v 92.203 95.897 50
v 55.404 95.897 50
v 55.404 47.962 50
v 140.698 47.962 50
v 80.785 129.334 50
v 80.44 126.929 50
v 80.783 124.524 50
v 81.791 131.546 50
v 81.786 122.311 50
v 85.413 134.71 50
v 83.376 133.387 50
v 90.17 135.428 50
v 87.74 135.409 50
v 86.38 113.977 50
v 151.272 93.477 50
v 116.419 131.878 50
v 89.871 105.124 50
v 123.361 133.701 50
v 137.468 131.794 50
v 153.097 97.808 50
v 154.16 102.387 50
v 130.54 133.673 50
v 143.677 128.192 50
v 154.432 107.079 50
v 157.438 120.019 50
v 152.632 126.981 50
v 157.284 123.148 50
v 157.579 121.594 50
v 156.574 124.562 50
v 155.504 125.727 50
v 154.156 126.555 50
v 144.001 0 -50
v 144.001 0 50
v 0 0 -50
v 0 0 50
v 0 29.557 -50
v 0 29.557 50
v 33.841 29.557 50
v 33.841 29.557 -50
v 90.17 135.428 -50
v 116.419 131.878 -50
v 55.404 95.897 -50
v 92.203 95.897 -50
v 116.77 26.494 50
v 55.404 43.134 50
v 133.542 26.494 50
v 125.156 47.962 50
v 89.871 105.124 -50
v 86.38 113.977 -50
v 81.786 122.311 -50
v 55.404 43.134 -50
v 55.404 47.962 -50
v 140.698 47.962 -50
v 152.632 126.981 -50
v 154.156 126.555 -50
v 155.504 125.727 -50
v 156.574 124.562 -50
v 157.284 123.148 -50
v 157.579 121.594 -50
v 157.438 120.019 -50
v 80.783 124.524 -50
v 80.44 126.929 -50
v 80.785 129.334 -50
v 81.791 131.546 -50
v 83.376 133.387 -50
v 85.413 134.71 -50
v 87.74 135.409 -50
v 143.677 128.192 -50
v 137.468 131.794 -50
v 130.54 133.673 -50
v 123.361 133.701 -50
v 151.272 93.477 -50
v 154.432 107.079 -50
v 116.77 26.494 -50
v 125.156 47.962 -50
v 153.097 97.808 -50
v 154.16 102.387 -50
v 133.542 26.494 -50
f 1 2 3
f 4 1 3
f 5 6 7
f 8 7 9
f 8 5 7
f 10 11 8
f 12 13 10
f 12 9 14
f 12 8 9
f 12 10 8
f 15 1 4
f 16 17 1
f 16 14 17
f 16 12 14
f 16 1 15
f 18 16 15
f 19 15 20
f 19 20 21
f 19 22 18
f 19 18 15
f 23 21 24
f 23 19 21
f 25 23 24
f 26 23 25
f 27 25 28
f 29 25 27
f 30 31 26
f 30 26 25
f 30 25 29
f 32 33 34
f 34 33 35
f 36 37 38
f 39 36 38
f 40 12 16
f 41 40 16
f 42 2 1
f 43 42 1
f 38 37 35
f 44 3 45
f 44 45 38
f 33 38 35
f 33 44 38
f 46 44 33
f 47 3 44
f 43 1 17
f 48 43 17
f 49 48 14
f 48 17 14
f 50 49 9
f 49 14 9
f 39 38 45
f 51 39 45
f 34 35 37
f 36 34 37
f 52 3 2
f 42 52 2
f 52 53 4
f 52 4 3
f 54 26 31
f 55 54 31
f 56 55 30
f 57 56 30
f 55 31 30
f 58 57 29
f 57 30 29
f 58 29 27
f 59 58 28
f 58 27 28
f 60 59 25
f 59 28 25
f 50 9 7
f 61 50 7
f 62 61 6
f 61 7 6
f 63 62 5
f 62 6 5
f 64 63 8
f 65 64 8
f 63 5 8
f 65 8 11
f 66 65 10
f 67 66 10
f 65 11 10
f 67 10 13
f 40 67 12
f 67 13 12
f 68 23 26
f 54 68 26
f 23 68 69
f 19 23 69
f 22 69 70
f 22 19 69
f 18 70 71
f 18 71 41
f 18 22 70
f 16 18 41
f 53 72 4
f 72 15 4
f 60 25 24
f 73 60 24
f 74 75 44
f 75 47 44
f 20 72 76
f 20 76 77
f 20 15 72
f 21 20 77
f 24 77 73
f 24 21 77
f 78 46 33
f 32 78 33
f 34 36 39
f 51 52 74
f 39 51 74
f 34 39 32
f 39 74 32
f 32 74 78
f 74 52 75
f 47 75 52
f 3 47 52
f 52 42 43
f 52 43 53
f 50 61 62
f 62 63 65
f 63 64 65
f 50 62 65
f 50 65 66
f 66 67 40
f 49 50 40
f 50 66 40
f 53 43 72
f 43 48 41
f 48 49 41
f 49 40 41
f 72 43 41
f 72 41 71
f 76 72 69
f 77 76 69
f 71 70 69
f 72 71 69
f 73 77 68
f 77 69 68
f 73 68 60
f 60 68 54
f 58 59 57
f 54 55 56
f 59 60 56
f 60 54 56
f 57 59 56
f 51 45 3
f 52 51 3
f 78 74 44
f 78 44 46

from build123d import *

# Parameters (mm, degrees)
SKETCH_1_R                     = 27.60110162
EXTRUDE_1_DEPTH                = 50
SPLIT_BODIES_1_SURFACE_1_BACK  = 231.64
SPLIT_BODIES_1_SURFACE_1_DEPTH = 463.28
SPLIT_BODIES_1_SURFACE_2_BACK  = 231.64
SPLIT_BODIES_1_SURFACE_2_DEPTH = 463.28


with BuildPart() as part:
    # 草图1 → 凸台-拉伸1 (new, symmetric)
    with BuildSketch(Plane.XY):
        with Locations((126.841, 106.3205)):
            Circle(SKETCH_1_R)
        with BuildLine():
            Line((0, 29.556947787), (33.841128496, 29.556947787))
            Line((33.841128496, 29.556947787), (55.404404979, 43.133825573))
            Line((55.404404979, 43.133825573), (55.404404979, 95.897124924))
            Line((55.404404979, 95.897124924), (92.202864513, 95.897124924))
            ThreePointArc((92.202864513, 95.897124924), (88.266951773, 109.605982584), (81.786119565, 122.311217777))
            ThreePointArc((81.786119565, 122.311217777), (81.790702408, 131.54578908), (90.169806602, 135.427533672))
            Line((90.169806602, 135.427533672), (152.632483554, 126.981321854))
            ThreePointArc((152.632483554, 126.981321854), (156.573746893, 124.561834969), (157.437634447, 120.018579331))
            Line((157.437634447, 120.018579331), (140.698476255, 47.962391292))
            Line((140.698476255, 47.962391292), (125.156200351, 47.962391292))
            Line((125.156200351, 47.962391292), (116.770080258, 26.493923855))
            Line((116.770080258, 26.493923855), (133.542320443, 26.493923855))
            Line((133.542320443, 26.493923855), (144.001, 0))
            Line((144.001, 0), (0, 0))
            Line((0, 0), (0, 29.556947787))
        make_face()
    extrude(amount=EXTRUDE_1_DEPTH, both=True)


with BuildPart() as body_2:
    # Split Bodies 1: the piece behind the surface
    add(part.part)
    # Split Bodies 1 surface: a surface, the sketch's curves swept straight by 463.28 mm
    with BuildLine(Plane.XY.offset(50).offset(-SPLIT_BODIES_1_SURFACE_1_BACK), mode=Mode.PRIVATE) as split_bodies_1_surface_1_path:
        Line((125.156200351, 47.962391292), (37.921543342, 47.962391292))
    split_bodies_1_surface_1 = Shell.extrude(split_bodies_1_surface_1_path.wire(), (0 * SPLIT_BODIES_1_SURFACE_1_DEPTH, 0 * SPLIT_BODIES_1_SURFACE_1_DEPTH, 1 * SPLIT_BODIES_1_SURFACE_1_DEPTH))
    split(bisect_by=split_bodies_1_surface_1, keep=Keep.BOTTOM)


with BuildPart() as part_1:
    add(part.part)

    # Split Bodies 1: split by a surface, the side it looks to stays
    # Split Bodies 1 surface: a surface, the sketch's curves swept straight by 463.28 mm
    with BuildLine(Plane.XY.offset(50).offset(-SPLIT_BODIES_1_SURFACE_2_BACK), mode=Mode.PRIVATE) as split_bodies_1_surface_2_path:
        Line((125.156200351, 47.962391292), (37.921543342, 47.962391292))
    split_bodies_1_surface_2 = Shell.extrude(split_bodies_1_surface_2_path.wire(), (0 * SPLIT_BODIES_1_SURFACE_2_DEPTH, 0 * SPLIT_BODIES_1_SURFACE_2_DEPTH, 1 * SPLIT_BODIES_1_SURFACE_2_DEPTH))
    split(bisect_by=split_bodies_1_surface_2, keep=Keep.TOP)


solid = Compound([body_2.part, part_1.part])
